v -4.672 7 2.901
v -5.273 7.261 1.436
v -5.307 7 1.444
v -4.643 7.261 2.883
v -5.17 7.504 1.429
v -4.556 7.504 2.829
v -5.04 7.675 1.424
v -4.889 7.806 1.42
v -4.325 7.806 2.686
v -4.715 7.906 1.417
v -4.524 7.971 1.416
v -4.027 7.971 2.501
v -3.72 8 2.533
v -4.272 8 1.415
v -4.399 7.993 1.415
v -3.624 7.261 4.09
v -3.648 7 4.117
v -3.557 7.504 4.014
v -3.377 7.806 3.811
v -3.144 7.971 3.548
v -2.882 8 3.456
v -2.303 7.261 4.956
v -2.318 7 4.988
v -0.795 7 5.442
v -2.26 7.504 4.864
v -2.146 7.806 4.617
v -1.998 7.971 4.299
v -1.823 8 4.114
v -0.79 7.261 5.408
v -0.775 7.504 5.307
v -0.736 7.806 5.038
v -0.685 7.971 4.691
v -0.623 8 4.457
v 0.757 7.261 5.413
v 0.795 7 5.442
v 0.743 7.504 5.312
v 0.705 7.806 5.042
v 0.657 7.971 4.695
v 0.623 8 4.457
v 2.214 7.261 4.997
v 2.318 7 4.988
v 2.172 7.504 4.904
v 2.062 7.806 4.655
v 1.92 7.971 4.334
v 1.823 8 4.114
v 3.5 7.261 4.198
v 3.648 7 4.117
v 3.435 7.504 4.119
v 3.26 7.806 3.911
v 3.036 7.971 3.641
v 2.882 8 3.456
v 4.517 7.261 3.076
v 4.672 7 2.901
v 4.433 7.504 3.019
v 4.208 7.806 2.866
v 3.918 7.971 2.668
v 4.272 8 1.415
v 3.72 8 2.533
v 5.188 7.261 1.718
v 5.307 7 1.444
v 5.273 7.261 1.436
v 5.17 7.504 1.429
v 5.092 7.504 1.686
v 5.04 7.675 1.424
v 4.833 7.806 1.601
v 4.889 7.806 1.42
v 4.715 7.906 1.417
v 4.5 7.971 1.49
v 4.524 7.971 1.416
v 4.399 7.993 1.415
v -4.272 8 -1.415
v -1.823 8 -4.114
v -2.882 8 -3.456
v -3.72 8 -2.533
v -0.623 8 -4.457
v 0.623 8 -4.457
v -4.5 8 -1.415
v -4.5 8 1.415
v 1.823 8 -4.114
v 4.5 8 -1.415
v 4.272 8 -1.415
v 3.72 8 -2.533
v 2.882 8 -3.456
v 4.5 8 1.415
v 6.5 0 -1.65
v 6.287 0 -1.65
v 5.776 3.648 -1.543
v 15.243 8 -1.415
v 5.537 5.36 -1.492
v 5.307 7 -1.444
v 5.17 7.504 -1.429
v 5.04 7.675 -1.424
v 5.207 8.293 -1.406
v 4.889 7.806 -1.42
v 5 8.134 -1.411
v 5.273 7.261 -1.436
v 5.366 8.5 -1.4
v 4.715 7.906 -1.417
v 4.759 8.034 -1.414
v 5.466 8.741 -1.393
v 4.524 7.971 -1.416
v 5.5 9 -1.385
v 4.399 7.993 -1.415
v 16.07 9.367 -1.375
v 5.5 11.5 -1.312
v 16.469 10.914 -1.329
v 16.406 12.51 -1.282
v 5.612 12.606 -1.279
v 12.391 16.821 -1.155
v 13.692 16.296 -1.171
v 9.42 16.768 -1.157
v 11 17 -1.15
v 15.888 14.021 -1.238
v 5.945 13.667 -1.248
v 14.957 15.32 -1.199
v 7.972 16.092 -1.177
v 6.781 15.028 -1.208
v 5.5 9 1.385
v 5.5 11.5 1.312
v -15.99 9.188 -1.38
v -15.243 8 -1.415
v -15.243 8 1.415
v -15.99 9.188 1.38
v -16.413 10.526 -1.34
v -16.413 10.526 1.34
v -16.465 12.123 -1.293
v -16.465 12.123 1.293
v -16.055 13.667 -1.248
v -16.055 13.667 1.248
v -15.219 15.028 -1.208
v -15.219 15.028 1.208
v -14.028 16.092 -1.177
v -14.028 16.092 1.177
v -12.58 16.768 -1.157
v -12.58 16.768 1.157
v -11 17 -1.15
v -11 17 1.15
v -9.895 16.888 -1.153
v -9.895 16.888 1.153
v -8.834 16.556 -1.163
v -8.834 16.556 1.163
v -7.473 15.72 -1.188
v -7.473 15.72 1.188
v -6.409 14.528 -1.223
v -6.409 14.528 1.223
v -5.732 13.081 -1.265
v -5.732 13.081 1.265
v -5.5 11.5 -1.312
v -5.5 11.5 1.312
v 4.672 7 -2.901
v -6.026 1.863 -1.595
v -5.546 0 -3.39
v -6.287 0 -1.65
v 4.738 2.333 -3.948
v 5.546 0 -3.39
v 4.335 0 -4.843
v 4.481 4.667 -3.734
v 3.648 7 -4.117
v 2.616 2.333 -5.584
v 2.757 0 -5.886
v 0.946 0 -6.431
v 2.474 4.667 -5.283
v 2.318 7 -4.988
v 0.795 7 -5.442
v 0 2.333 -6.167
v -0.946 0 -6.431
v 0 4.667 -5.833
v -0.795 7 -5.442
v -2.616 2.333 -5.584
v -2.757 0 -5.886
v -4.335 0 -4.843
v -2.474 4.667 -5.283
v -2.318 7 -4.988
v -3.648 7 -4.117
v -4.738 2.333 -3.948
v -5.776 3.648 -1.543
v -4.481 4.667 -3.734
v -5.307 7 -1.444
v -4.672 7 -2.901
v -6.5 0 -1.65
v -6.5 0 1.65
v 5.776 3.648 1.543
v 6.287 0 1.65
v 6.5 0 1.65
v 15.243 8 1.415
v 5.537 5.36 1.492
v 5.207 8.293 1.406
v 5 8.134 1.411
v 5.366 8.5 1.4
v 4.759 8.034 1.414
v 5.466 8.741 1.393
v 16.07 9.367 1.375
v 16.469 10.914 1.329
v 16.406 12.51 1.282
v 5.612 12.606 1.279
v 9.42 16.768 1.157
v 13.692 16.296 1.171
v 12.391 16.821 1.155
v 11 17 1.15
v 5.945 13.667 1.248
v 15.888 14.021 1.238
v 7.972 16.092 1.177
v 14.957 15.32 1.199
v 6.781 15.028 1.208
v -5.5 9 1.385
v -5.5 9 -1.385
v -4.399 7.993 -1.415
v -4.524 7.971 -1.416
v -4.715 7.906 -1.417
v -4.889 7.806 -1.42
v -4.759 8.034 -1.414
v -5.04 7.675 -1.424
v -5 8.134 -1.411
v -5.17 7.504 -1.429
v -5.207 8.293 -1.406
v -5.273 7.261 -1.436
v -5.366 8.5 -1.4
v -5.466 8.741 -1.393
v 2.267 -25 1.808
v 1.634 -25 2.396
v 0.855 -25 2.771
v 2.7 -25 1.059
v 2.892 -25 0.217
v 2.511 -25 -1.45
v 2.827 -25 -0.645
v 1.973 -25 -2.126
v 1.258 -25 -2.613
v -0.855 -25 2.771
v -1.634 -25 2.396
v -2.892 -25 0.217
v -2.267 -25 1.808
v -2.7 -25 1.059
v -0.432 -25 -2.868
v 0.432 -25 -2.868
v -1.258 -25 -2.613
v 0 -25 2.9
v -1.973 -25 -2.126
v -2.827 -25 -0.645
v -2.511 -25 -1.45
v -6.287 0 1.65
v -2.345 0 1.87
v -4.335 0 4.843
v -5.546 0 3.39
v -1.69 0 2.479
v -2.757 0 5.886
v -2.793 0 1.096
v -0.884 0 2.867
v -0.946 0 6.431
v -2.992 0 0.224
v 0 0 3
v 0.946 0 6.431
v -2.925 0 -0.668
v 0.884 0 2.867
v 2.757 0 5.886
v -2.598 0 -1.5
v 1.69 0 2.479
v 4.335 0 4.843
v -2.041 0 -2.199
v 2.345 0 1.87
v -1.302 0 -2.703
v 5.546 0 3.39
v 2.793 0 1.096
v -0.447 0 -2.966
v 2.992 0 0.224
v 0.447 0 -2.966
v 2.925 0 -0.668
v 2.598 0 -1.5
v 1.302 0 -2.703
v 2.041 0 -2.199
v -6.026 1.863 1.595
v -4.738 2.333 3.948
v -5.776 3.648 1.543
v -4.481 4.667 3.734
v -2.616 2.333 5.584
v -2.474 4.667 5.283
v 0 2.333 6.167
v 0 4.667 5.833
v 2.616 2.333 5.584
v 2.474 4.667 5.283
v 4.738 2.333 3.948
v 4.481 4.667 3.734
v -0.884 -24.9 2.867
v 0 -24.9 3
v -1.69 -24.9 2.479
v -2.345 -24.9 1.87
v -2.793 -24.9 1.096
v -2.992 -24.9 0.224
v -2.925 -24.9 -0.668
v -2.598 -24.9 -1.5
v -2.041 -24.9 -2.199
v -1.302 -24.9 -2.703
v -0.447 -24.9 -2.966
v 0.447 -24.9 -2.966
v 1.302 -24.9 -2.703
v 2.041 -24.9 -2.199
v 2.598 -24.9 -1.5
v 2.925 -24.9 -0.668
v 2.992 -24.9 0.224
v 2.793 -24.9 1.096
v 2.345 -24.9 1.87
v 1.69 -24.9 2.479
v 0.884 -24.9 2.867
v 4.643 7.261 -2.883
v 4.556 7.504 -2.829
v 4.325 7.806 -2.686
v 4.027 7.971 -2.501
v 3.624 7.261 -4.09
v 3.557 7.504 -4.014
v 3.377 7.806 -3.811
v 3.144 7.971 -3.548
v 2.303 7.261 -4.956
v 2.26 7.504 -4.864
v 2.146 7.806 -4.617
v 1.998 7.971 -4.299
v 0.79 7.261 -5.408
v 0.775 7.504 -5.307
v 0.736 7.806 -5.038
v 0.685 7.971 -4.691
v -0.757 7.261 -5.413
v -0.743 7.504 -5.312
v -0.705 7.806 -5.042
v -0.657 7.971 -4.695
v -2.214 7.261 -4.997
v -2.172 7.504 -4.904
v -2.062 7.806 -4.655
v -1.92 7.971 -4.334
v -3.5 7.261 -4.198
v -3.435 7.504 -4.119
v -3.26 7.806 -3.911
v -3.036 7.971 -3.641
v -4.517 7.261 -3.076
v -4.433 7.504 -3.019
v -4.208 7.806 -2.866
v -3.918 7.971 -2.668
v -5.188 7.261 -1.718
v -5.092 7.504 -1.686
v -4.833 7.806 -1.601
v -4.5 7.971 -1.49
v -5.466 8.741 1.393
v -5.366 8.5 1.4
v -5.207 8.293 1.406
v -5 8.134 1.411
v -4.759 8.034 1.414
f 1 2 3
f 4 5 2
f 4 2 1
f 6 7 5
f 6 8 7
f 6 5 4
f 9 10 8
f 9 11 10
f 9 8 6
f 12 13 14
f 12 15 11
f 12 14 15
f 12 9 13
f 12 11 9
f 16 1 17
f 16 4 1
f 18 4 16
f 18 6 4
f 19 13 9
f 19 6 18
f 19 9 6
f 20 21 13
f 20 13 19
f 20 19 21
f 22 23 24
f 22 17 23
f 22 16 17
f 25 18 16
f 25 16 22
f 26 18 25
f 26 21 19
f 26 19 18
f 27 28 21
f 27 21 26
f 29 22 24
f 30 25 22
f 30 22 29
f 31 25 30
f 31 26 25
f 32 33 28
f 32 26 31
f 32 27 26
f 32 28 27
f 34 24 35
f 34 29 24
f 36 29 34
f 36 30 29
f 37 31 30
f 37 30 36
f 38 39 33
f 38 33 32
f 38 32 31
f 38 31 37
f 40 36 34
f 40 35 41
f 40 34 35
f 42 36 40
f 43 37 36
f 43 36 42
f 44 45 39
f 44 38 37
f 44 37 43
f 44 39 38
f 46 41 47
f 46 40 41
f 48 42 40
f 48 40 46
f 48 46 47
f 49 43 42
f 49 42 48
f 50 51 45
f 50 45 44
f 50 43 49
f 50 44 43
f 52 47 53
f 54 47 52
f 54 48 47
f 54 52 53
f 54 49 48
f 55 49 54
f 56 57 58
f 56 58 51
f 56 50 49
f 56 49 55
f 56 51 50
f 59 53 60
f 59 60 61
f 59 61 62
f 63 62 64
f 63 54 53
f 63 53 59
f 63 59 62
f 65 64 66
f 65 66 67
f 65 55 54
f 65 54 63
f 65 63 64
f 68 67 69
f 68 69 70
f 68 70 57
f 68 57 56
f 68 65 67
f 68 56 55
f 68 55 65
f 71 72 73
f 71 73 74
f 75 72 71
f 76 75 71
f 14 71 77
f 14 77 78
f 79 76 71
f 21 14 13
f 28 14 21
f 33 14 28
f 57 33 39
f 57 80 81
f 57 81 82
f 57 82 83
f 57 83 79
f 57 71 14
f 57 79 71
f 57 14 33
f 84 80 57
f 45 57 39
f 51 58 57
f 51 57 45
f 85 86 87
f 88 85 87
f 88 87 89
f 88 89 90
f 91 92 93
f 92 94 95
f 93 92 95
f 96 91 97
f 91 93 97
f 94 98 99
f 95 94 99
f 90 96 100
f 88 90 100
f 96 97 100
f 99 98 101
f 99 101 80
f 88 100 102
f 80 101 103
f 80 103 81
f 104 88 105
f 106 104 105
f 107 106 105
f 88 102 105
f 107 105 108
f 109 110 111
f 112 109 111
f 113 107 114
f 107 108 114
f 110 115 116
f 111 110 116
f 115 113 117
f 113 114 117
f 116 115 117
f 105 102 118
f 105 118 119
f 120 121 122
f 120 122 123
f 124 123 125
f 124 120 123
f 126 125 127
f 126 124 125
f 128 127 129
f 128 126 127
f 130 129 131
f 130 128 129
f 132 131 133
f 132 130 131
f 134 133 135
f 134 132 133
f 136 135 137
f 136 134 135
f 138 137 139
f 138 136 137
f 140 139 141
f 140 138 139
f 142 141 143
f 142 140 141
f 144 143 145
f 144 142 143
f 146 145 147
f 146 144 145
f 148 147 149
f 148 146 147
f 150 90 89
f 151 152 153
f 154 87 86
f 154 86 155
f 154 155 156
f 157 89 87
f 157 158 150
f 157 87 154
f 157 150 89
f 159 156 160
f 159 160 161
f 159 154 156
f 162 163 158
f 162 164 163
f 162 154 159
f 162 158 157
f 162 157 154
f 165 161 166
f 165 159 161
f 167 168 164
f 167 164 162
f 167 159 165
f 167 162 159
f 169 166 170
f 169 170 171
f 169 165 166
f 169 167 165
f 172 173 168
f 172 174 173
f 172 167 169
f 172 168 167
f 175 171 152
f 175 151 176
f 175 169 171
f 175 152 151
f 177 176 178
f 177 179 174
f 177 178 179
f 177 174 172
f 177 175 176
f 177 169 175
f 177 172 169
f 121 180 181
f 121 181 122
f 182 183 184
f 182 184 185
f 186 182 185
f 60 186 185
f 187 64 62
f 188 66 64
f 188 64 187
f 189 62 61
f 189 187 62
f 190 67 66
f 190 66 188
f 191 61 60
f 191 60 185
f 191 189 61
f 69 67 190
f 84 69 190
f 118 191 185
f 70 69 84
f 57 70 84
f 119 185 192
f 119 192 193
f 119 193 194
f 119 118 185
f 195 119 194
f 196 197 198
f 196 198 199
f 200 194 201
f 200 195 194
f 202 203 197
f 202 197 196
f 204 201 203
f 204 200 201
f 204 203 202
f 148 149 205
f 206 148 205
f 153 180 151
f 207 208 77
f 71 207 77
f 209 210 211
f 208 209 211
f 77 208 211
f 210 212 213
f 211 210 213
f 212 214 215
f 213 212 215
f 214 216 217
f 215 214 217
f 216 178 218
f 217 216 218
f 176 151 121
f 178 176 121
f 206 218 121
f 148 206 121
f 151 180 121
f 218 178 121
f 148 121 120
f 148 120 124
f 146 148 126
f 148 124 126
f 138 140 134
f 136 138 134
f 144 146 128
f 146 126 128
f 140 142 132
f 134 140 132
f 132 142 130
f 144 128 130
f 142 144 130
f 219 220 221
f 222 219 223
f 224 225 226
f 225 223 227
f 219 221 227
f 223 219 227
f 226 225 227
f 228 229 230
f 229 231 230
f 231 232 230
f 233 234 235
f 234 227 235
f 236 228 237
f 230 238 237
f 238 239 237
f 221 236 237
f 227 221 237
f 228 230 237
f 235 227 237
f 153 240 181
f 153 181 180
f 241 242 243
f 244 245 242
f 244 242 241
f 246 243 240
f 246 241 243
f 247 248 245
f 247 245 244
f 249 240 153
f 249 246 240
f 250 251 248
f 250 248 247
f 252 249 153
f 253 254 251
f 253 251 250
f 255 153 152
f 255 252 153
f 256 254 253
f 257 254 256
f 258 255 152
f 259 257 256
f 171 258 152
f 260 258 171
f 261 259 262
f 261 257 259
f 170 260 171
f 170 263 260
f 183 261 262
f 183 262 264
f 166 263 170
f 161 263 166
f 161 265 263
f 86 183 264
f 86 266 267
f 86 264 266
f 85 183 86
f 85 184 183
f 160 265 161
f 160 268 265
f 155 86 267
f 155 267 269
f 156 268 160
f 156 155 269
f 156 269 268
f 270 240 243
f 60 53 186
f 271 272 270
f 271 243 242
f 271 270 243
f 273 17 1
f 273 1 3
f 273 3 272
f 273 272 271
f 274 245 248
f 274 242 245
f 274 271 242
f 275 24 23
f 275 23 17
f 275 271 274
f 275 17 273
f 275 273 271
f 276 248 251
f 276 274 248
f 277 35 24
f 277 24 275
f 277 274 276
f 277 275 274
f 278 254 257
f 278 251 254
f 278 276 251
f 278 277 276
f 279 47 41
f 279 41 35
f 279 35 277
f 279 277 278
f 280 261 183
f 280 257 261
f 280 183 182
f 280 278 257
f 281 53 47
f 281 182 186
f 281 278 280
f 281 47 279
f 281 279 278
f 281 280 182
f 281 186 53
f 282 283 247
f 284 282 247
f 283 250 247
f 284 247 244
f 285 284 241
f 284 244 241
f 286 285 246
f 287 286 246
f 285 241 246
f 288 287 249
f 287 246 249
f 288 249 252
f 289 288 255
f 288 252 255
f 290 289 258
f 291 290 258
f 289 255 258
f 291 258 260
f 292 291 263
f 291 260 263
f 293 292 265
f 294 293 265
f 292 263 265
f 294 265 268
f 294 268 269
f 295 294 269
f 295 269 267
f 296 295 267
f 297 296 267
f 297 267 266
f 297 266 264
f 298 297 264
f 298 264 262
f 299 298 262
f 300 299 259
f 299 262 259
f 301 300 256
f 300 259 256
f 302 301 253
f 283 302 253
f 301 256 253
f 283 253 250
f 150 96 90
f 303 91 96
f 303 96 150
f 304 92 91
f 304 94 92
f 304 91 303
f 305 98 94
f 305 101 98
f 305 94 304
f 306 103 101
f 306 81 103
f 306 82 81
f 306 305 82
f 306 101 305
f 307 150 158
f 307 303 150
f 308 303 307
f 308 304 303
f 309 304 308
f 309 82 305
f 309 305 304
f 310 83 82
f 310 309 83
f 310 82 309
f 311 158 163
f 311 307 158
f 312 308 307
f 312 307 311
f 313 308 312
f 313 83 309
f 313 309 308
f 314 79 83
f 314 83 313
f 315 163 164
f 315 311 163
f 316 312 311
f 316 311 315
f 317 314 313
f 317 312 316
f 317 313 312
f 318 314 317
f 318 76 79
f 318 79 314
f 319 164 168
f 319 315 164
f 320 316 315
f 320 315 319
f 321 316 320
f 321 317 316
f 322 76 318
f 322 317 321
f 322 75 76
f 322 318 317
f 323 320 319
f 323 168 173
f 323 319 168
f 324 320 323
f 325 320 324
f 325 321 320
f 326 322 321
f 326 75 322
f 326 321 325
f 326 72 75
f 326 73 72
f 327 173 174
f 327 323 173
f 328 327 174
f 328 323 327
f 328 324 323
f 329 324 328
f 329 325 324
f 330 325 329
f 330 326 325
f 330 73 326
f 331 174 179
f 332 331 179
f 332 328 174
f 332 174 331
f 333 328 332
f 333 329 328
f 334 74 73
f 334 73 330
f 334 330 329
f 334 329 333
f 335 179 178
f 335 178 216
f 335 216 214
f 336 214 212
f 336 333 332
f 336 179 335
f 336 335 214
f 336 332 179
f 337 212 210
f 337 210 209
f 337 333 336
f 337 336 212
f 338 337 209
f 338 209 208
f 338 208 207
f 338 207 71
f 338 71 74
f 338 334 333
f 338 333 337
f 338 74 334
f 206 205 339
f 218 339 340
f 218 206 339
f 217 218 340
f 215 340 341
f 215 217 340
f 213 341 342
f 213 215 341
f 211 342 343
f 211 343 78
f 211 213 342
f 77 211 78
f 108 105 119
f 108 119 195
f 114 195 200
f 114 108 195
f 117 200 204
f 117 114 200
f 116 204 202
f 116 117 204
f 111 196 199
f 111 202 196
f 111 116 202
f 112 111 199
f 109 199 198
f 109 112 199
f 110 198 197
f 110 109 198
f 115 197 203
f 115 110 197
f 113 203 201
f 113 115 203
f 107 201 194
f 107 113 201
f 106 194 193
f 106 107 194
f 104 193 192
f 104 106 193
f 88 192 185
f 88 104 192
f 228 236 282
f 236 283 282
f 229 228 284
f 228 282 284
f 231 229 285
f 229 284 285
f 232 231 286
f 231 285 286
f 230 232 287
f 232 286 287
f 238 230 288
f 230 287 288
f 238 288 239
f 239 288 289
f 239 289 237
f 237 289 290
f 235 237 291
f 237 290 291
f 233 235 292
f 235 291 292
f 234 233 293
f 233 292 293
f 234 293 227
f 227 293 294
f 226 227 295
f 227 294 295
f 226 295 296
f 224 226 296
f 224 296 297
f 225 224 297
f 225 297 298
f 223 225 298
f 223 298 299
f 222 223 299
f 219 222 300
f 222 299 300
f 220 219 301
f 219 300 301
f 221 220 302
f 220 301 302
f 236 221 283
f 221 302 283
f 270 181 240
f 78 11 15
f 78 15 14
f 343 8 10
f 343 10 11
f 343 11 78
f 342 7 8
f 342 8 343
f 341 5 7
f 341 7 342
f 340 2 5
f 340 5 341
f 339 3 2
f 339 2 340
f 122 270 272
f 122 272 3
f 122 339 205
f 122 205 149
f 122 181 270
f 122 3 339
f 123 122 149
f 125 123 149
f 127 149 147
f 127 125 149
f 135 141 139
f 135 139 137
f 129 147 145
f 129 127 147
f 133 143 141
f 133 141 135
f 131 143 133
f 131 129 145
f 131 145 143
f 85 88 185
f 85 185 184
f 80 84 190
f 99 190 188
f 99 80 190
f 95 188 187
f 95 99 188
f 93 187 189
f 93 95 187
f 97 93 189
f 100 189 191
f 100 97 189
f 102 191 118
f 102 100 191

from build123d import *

# Parameters (mm, degrees)
BOSS_EXTRUDE1_DEPTH      = 1.65
BOSS_EXTRUDE1_DEPTH_BACK = 1.65
CUT_EXTRUDE2_DEPTH       = 81
CUT_EXTRUDE2_DEPTH_BACK  = 103


with BuildPart() as part:
    # Sketch1 → Boss-Extrude1 (new, two sides: drawn at the far end of the back side and taken through both)
    with BuildSketch(Plane.XY.offset(-BOSS_EXTRUDE1_DEPTH_BACK)):
        with BuildLine():
            Line((-6.5, 0), (-15.242640687, 8))
            ThreePointArc((-15.242640687, 8), (-12.859499425, 16.676124215), (-5.5, 11.5))
            Line((-5.5, 11.5), (-5.5, 9))
            ThreePointArc((-5.5, 9), (-5.207106781, 8.292893219), (-4.5, 8))
            Line((-4.5, 8), (4.5, 8))
            ThreePointArc((4.5, 8), (5.207106781, 8.292893219), (5.5, 9))
            Line((5.5, 9), (5.5, 11.5))
            ThreePointArc((5.5, 11.5), (12.859499425, 16.676124215), (15.242640687, 8))
            Line((15.242640687, 8), (6.5, 0))
            Line((6.5, 0), (-6.5, 0))
        make_face()
    extrude(amount=BOSS_EXTRUDE1_DEPTH + BOSS_EXTRUDE1_DEPTH_BACK)

    # Sketch6 → Cut-Extrude2 (cut, two sides: drawn at the far end of the back side and taken through both)
    with BuildSketch(Plane(origin=(0, 0, 0), x_dir=(0, 0, -1), z_dir=(1, 0, 0)).offset(-CUT_EXTRUDE2_DEPTH_BACK)):
        Polygon((-3, 0), (-1.65, 0), (-1.15, 17), (-3, 17), align=None)
        Polygon((1.15, 17), (3, 17), (3, 0), (1.65, 0), align=None)
    extrude(amount=CUT_EXTRUDE2_DEPTH + CUT_EXTRUDE2_DEPTH_BACK, mode=Mode.SUBTRACT)

    # Sketch2 → Revolve1 (revolve)
    with BuildSketch(Plane(origin=(0, 0, 0), x_dir=(0, 0, -1), z_dir=(1, 0, 0))):
        with BuildLine():
            Line((0, 0), (-6.5, 0))
            Line((-6.5, 0), (-5.5, 7))
            ThreePointArc((-5.5, 7), (-5.207106781, 7.707106781), (-4.5, 8))
            Line((-4.5, 8), (0, 8))
            Line((0, 8), (0, 0))
        make_face()
    revolve(axis=Axis((0, 0, 0), (0, 1, 0)))

    # Sketch7 → Revolve2 (revolve)
    with BuildSketch(Plane(origin=(0, 0, 0), x_dir=(0, 0, -1), z_dir=(1, 0, 0))):
        Polygon((0, -25), (-2.9, -25), (-3, -24.9), (-3, 0), (0, 0), align=None)
    revolve(axis=Axis((0, 0, 0), (0, -1, 0)))


solid = part.part
